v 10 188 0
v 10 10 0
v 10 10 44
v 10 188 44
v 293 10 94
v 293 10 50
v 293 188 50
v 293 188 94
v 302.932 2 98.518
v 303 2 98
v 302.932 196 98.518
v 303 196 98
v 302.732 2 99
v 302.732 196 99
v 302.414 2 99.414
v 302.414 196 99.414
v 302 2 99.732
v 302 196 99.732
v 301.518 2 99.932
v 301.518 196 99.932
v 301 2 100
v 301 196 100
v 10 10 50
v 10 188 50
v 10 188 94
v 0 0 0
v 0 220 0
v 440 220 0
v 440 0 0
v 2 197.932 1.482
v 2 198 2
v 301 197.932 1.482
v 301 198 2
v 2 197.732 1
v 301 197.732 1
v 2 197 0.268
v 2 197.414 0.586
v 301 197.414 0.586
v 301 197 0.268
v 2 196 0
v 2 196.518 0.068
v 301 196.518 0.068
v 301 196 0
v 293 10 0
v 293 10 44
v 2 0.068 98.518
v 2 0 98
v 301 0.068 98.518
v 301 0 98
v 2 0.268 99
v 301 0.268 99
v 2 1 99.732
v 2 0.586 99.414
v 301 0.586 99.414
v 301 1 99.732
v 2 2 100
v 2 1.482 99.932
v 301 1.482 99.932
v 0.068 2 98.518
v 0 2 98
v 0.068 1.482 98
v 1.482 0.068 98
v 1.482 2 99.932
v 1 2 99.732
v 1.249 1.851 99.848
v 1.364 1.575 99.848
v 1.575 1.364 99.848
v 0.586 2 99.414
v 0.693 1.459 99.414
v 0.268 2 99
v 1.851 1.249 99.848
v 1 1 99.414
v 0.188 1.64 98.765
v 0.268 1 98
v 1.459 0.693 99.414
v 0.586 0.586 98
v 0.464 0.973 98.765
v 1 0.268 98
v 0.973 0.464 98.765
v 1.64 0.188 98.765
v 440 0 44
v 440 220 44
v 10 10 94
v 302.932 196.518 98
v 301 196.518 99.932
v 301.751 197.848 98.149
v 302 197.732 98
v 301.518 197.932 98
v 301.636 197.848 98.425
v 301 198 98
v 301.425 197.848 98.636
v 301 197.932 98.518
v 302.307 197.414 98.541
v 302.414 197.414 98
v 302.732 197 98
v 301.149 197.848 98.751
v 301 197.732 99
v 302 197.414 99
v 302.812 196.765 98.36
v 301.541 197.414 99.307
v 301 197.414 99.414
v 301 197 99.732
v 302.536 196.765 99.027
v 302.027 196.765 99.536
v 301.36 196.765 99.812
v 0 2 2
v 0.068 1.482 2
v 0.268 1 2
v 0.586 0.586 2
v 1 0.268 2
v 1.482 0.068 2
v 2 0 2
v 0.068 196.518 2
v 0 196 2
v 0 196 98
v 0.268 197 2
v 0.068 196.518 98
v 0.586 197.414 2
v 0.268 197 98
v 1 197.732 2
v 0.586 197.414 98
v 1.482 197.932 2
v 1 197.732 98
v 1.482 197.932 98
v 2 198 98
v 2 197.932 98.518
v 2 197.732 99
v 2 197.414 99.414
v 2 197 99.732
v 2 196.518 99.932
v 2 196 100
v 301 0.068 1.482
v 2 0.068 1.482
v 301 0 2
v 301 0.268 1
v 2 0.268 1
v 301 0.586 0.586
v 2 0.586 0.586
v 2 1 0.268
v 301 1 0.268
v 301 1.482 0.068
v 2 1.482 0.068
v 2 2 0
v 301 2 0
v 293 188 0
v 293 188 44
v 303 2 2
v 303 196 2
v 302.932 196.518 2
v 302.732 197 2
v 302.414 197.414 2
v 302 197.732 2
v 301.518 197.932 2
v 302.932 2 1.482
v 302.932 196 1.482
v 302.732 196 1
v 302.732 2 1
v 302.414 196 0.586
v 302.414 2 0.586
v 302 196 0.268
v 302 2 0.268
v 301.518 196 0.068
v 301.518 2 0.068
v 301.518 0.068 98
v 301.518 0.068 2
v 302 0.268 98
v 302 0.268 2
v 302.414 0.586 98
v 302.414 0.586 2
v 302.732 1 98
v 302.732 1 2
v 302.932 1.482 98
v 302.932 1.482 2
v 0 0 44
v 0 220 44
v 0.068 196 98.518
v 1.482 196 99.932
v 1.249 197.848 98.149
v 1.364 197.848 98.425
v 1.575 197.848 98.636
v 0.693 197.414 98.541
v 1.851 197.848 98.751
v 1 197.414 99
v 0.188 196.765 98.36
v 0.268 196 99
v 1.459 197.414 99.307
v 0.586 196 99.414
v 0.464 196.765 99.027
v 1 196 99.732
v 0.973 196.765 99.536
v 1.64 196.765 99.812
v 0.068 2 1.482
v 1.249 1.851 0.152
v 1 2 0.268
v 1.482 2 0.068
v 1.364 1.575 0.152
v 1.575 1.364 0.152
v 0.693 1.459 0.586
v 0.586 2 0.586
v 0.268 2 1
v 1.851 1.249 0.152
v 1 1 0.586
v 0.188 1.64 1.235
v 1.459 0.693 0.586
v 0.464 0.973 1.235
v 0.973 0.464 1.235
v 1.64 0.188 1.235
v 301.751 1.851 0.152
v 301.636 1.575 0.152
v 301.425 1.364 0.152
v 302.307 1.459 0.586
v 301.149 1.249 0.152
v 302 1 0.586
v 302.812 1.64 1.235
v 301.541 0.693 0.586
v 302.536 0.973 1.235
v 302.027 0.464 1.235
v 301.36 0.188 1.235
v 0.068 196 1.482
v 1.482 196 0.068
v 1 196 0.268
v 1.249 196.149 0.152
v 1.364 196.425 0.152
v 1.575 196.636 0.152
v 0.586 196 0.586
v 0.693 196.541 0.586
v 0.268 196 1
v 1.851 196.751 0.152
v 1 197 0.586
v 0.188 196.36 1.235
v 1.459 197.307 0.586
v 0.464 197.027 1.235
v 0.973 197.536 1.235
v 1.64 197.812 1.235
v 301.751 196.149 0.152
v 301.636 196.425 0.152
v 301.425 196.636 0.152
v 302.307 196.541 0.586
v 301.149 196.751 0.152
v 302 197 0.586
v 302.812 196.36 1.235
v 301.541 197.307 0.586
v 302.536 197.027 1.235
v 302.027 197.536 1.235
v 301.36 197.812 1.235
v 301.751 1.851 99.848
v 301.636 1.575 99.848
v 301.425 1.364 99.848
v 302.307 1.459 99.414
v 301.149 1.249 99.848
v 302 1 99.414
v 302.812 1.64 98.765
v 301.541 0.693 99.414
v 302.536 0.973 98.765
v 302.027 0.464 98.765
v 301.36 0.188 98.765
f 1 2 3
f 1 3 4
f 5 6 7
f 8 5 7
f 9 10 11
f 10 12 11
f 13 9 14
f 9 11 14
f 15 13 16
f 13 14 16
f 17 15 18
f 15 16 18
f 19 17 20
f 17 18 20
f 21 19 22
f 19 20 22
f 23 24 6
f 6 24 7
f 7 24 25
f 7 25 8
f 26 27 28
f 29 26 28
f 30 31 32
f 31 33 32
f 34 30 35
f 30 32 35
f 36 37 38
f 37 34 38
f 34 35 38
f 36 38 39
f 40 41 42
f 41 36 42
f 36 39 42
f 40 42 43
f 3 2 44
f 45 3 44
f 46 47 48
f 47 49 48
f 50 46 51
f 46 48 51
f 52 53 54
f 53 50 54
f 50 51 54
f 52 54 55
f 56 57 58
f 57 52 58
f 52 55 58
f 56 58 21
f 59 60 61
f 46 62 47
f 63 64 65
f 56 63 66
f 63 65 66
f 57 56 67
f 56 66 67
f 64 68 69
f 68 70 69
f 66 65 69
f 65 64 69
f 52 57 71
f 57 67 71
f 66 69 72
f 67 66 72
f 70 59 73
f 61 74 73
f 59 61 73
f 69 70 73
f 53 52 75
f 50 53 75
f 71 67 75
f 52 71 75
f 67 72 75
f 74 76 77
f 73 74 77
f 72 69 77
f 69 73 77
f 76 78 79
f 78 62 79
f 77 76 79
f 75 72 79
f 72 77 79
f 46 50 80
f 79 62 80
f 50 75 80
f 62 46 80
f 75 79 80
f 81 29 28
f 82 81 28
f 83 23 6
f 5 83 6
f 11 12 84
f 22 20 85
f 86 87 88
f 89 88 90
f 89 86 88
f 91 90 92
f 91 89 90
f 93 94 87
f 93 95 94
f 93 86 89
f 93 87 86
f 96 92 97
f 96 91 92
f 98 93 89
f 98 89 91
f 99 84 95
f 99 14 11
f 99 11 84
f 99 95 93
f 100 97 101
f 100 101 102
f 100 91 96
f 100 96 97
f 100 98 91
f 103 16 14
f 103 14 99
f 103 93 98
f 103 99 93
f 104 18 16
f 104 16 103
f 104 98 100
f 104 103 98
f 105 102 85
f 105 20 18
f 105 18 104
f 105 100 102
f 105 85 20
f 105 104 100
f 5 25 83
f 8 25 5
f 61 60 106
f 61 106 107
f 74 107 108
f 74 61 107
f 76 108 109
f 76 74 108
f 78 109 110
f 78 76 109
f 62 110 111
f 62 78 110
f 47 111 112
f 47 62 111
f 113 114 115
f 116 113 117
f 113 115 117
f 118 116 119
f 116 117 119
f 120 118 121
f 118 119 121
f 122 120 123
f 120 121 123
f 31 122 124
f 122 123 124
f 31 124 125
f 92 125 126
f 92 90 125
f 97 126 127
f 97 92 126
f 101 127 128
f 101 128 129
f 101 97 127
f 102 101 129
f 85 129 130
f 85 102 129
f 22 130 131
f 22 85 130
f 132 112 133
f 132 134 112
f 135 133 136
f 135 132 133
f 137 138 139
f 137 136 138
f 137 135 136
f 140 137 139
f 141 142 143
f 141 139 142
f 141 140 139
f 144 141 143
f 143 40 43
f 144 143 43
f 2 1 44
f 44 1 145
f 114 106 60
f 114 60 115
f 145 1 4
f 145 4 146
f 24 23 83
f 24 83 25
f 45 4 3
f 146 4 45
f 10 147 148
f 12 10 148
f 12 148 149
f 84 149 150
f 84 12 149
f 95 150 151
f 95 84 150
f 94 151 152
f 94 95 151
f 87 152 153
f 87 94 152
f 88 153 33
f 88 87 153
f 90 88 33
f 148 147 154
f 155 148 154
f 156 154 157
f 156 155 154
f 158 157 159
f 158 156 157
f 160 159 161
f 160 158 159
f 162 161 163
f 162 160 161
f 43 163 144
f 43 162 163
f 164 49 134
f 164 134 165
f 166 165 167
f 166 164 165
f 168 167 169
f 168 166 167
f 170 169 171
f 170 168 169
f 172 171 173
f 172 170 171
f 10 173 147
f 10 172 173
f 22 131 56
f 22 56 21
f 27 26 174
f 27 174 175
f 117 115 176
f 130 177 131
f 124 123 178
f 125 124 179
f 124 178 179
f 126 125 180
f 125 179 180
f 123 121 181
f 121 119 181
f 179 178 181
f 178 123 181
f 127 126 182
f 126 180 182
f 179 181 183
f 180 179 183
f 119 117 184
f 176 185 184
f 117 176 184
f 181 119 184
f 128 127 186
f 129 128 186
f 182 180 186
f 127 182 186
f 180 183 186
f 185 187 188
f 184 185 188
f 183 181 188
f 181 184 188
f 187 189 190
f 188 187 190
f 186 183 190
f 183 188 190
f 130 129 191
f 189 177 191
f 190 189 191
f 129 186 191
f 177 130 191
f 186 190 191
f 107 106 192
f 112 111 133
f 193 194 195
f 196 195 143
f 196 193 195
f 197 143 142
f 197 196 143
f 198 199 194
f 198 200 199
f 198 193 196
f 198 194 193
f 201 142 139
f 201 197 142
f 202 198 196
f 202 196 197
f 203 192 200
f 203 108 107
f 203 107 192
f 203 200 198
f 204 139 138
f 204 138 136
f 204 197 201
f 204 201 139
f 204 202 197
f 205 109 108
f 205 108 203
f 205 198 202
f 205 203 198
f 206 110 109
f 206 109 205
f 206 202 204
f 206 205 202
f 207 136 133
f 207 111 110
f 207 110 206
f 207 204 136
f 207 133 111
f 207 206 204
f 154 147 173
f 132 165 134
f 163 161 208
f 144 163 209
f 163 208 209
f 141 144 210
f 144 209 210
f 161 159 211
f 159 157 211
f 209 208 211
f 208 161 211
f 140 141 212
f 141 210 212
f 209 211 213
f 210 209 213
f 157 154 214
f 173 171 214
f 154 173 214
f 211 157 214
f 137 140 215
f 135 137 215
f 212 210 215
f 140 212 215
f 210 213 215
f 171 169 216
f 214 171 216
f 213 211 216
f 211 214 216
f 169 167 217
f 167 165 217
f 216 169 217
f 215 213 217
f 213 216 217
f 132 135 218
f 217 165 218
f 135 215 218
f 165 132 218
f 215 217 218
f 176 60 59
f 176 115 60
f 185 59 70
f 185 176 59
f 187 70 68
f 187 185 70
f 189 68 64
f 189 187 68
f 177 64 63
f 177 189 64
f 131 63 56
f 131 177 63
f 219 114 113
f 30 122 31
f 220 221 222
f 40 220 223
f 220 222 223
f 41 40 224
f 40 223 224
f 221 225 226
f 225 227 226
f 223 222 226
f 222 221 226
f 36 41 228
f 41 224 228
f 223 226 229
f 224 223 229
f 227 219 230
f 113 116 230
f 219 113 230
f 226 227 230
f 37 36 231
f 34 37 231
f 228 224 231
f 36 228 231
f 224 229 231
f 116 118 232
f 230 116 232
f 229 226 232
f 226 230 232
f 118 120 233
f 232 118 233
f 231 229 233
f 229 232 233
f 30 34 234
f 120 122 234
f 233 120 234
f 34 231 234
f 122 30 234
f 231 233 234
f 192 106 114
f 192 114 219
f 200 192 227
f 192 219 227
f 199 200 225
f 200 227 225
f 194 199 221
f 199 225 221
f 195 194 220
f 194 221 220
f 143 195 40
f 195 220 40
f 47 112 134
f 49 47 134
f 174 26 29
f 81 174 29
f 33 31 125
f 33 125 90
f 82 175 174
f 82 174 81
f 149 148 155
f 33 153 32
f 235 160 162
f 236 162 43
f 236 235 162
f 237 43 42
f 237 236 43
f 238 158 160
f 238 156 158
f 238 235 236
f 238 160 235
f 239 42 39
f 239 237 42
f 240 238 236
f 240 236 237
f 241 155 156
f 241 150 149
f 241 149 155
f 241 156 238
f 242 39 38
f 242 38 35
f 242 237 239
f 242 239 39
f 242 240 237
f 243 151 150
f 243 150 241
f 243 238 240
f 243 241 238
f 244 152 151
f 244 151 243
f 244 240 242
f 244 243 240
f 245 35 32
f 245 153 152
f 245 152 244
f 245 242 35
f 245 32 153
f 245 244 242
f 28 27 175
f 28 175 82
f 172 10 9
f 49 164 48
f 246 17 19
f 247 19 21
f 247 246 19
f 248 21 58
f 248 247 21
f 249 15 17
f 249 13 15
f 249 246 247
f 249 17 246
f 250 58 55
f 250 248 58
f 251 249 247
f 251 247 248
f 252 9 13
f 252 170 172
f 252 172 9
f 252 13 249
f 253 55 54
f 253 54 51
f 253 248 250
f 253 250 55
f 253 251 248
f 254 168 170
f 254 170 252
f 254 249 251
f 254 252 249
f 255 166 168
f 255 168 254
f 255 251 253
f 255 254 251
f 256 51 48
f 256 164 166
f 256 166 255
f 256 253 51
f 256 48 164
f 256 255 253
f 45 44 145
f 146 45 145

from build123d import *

# Parameters (mm, degrees)
BOX_W        = 440
BOX_H        = 220
BOX_DEPTH    = 44
BOX001_W     = 283
BOX001_H     = 178
BOX001_DEPTH = 44
BOX003_W     = 283
BOX003_H     = 178
BOX003_DEPTH = 44
BOX002_W     = 303
BOX002_H     = 198
BOX002_DEPTH = 100
FILLET_R     = 2


with BuildPart() as f_48switcher:
    # Box → Box (new body)
    with BuildSketch(Plane.XY):
        with Locations((220, 110)):
            Rectangle(BOX_W, BOX_H)
    extrude(amount=BOX_DEPTH)


with BuildPart() as f_24swicher1:
    # Box001 → Box001 (new body)
    with BuildSketch(Plane(origin=(10, 10, 50), x_dir=(1, 0, 0), z_dir=(0, 0, 1))):
        with Locations((141.5, 89)):
            Rectangle(BOX001_W, BOX001_H)
    extrude(amount=BOX001_DEPTH)


with BuildPart() as f_24swicher2:
    # Box003 → Box003 (new body)
    with BuildSketch(Plane(origin=(10, 10, 0), x_dir=(1, 0, 0), z_dir=(0, 0, 1))):
        with Locations((141.5, 89)):
            Rectangle(BOX003_W, BOX003_H)
    extrude(amount=BOX003_DEPTH)


with BuildPart() as fillet_body:
    # Box002 → Box002 (new body)
    with BuildSketch(Plane.XY):
        with Locations((151.5, 99)):
            Rectangle(BOX002_W, BOX002_H)
    extrude(amount=BOX002_DEPTH)

    # Fillet
    fillet_edges = [fillet_body.edges().sort_by_distance(p)[0] for p in [
        (0, 0, 50),
        (0, 99, 100),
        (0, 198, 50),
        (0, 99, 0),
        (303, 0, 50),
        (303, 99, 100),
        (303, 198, 50),
        (303, 99, 0),
        (151.5, 0, 0),
        (151.5, 0, 100),
        (151.5, 198, 0),
        (151.5, 198, 100),
    ]]
    fillet(fillet_edges, radius=FILLET_R)


solid = Compound([f_48switcher.part, f_24swicher1.part, f_24swicher2.part, fillet_body.part])
